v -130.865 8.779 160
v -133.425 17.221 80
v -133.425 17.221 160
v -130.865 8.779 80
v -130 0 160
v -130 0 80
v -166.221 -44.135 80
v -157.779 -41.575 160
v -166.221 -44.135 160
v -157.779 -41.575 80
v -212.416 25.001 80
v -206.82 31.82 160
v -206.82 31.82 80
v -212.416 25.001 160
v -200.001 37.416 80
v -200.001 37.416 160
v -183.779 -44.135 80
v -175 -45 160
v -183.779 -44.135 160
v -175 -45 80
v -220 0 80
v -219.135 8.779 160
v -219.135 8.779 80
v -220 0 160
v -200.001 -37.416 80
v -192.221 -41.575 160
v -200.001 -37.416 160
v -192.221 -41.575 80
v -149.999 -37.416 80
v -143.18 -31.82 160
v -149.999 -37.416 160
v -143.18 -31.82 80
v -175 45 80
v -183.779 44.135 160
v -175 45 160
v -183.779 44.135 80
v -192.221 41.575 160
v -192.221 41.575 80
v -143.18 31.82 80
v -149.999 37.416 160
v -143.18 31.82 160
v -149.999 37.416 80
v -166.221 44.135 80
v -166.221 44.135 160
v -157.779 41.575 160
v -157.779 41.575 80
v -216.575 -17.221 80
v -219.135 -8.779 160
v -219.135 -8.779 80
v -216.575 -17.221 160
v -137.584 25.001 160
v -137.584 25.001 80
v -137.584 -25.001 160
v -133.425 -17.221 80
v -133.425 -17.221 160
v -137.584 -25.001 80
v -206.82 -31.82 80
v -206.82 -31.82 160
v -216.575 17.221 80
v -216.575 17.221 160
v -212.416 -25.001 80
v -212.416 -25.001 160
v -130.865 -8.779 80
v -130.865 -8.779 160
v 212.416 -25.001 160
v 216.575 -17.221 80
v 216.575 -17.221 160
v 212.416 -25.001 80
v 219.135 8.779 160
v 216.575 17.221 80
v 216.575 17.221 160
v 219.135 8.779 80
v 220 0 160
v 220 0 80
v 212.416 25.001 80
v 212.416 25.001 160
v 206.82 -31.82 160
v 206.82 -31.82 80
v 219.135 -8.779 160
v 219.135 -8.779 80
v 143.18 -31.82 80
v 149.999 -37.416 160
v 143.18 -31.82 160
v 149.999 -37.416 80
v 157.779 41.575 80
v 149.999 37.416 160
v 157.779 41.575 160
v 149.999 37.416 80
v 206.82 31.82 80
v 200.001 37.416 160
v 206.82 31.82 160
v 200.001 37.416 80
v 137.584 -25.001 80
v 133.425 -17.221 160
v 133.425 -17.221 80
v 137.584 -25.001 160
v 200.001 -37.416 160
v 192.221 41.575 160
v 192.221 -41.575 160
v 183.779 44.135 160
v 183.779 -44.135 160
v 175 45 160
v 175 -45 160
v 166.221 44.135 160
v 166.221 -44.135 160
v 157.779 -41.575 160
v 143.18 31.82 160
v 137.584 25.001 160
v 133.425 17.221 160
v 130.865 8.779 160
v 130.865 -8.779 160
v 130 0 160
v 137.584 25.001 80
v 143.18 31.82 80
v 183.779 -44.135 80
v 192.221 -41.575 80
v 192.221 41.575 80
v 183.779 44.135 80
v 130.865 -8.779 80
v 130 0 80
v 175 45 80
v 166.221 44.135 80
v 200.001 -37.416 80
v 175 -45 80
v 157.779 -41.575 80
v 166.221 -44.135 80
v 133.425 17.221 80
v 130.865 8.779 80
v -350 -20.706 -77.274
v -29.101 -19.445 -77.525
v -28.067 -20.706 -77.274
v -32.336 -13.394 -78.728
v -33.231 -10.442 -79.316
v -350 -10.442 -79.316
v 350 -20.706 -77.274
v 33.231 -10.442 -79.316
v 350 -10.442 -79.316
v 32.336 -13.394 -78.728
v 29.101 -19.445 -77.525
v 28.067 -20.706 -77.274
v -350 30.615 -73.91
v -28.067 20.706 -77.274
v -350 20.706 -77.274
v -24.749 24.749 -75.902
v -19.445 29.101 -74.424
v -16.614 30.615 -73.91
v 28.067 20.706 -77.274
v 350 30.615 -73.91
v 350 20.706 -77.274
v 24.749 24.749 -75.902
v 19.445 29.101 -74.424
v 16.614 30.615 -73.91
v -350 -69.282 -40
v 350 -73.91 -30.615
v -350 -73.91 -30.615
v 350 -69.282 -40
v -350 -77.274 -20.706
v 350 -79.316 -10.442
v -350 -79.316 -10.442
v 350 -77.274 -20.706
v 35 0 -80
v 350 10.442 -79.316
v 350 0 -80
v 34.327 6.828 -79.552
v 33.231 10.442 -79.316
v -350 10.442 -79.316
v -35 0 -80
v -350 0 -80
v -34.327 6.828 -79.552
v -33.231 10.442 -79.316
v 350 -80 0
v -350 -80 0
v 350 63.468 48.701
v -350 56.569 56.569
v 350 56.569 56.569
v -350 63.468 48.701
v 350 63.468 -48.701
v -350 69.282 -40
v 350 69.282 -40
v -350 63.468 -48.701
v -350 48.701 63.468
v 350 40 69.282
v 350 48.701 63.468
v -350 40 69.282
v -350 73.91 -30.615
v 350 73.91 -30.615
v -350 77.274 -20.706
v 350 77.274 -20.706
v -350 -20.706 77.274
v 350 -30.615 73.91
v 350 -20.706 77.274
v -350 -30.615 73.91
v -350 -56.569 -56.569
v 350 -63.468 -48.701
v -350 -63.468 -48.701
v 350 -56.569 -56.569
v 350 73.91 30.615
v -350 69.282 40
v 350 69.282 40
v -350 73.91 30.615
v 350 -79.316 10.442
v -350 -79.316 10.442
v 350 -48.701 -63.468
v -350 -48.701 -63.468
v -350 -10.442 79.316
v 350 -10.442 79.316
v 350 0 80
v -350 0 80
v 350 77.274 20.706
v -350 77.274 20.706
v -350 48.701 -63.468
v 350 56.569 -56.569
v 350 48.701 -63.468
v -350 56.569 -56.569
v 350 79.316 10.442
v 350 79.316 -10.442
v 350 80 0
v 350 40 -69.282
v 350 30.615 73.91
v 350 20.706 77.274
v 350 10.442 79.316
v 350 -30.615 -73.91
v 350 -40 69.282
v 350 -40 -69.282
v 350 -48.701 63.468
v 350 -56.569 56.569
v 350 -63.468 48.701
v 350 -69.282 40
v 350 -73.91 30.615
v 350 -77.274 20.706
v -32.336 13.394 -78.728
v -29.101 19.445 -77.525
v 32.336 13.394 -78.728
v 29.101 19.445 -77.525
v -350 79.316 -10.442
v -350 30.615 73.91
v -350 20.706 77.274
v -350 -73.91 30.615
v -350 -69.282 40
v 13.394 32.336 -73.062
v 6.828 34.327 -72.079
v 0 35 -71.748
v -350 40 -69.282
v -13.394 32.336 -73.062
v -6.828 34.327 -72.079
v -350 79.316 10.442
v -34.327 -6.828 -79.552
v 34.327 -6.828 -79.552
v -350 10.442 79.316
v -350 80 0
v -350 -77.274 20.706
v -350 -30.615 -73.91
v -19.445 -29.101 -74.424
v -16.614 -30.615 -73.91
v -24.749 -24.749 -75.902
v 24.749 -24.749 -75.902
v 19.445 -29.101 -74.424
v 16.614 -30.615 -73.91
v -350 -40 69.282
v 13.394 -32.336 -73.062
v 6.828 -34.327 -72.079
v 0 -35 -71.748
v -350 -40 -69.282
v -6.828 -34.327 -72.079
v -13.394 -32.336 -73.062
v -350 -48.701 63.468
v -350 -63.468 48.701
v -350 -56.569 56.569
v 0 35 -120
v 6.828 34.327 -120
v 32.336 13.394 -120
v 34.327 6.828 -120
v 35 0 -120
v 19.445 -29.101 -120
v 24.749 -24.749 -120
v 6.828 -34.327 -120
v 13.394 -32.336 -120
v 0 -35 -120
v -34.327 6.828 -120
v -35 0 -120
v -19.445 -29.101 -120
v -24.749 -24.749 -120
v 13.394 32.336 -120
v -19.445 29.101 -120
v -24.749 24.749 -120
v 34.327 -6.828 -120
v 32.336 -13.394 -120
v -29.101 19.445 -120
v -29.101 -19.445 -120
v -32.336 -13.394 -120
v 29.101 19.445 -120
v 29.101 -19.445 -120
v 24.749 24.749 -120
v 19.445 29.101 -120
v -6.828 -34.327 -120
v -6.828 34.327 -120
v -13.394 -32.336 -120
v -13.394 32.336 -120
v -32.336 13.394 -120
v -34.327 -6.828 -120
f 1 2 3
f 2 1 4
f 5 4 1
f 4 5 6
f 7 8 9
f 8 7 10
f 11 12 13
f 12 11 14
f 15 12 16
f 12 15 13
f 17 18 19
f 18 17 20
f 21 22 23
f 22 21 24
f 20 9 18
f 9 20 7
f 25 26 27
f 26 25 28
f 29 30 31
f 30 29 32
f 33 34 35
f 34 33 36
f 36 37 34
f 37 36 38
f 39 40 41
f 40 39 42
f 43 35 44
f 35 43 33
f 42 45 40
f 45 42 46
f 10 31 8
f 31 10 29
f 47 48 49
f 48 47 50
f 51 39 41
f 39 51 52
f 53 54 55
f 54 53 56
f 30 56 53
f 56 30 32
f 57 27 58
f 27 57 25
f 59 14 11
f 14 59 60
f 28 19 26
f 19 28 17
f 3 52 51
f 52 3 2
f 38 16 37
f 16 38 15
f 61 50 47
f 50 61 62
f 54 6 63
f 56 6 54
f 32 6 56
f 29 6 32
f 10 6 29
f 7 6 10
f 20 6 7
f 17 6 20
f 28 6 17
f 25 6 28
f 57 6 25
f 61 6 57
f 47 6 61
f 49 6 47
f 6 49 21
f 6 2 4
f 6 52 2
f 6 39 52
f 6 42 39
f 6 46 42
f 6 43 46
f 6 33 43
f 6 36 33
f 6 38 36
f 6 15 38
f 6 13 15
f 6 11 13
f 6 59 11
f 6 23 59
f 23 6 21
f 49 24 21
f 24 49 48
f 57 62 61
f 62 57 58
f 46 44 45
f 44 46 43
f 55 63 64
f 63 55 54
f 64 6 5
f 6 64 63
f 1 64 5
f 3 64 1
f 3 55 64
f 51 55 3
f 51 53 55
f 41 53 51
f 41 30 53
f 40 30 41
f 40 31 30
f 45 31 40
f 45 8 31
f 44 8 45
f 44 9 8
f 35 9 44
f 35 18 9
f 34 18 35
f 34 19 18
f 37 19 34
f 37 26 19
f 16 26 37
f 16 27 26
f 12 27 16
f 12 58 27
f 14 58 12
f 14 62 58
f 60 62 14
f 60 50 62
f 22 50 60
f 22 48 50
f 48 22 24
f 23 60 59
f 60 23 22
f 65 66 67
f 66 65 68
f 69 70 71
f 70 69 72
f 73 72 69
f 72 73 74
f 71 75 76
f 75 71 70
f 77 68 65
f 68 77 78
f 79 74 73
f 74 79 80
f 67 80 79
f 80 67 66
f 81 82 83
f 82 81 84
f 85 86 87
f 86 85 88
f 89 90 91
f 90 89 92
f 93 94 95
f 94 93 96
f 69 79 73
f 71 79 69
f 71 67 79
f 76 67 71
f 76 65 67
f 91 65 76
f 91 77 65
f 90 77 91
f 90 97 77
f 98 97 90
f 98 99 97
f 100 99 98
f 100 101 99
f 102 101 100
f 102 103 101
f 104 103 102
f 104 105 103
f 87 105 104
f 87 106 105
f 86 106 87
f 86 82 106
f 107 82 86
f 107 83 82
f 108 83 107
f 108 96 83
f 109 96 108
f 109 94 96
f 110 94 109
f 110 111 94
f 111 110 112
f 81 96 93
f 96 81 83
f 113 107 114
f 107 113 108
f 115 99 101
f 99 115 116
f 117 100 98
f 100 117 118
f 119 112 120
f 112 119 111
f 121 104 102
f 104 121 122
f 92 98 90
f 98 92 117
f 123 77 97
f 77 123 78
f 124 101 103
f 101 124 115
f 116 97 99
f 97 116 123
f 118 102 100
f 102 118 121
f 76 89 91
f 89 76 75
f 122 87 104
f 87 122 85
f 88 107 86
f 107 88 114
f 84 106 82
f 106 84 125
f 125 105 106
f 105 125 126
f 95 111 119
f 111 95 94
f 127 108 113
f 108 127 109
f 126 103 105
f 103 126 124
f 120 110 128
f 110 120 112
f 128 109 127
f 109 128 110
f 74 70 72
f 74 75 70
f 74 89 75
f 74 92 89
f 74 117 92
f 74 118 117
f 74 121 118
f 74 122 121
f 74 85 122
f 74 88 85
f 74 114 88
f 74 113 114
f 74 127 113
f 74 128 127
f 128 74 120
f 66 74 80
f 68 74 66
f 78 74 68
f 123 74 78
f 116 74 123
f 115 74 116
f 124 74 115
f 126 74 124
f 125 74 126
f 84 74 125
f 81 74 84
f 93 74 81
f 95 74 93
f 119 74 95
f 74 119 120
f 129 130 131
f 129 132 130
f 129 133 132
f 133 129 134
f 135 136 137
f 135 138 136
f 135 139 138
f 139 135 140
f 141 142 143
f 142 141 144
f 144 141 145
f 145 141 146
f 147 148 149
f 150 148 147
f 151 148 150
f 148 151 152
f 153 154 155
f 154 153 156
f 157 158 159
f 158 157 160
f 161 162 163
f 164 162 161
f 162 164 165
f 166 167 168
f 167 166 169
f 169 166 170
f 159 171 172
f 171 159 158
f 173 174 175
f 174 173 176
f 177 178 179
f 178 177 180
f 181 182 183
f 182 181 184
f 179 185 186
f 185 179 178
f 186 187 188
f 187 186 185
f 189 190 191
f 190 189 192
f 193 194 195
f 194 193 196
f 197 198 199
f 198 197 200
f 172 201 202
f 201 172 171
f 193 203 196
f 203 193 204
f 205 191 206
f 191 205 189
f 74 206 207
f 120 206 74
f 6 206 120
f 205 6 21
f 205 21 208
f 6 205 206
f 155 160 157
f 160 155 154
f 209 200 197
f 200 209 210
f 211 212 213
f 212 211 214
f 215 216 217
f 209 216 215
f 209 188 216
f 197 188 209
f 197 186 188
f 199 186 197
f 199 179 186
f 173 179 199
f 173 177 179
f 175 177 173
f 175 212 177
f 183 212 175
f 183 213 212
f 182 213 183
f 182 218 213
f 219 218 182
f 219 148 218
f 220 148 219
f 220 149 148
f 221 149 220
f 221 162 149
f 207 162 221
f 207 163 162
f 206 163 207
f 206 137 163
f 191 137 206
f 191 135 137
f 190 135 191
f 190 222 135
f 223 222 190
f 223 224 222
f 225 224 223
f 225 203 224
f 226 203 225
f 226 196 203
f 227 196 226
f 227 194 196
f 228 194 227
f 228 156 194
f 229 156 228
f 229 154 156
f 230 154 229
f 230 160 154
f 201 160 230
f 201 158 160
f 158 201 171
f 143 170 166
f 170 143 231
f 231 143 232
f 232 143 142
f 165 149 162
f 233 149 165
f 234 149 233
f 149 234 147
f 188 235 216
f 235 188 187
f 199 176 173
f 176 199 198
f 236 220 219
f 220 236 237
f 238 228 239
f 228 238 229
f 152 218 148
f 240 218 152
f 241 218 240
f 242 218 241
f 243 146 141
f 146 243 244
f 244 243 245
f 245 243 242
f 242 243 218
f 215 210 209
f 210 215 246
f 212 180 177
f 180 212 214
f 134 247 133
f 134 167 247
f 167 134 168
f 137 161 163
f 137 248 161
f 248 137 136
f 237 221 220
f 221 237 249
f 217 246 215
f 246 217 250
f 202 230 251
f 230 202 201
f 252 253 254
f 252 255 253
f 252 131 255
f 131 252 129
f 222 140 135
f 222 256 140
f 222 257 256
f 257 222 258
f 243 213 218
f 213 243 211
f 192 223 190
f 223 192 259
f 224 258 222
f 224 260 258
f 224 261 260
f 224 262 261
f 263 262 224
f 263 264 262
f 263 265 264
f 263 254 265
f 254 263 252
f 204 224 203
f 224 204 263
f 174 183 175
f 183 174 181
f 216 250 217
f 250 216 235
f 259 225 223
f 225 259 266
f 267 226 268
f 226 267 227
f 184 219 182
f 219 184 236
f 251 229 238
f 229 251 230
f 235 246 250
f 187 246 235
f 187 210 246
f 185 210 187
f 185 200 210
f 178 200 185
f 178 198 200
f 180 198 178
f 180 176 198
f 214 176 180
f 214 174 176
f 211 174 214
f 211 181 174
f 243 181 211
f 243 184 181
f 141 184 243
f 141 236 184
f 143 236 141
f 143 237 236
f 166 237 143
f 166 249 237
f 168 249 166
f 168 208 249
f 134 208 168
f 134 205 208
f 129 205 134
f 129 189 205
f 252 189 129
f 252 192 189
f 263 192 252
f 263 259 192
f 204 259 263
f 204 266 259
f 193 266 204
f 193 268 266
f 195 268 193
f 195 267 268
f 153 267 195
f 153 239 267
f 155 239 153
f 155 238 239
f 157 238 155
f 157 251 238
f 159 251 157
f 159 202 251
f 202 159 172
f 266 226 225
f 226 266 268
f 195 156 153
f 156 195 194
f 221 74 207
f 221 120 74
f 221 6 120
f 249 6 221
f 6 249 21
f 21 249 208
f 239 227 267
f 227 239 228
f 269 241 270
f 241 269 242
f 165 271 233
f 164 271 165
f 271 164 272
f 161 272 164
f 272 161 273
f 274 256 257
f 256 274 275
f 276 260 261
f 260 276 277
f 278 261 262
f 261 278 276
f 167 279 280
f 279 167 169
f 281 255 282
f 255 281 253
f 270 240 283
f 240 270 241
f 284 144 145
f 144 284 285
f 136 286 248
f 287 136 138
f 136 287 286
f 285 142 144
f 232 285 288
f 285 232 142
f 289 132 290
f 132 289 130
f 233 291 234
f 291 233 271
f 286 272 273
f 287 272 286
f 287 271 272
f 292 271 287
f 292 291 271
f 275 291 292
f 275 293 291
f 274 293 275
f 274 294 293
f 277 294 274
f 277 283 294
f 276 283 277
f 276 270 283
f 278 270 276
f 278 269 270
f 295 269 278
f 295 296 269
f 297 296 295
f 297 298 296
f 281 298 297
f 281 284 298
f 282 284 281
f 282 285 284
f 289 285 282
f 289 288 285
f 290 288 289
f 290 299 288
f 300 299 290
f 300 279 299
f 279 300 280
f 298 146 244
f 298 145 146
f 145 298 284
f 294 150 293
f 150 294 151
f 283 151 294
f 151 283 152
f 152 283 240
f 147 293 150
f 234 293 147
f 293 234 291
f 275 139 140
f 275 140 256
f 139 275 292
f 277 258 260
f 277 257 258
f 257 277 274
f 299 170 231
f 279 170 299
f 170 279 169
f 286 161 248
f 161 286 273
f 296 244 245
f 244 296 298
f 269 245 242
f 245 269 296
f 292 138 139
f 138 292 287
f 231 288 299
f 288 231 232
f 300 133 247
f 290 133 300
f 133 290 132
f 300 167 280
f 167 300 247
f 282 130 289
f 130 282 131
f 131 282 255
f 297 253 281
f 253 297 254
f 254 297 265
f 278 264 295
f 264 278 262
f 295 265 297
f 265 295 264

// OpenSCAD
// RPZ reduced-pressure-zone backflow preventer (approx), 4".
body_l = 700;
body_d = 160;
union() {
    rotate([0, 90, 0])
        cylinder(h = body_l, d = body_d, center = true, $fn = 48);
    // Two check valve bonnets
    for (x = [-body_l * 0.25, body_l * 0.25])
        translate([x, 0, body_d / 2])
            cylinder(h = 80, d = 90, $fn = 32);
    // Relief valve in middle
    translate([0, 0, -body_d / 2 - 40])
        cylinder(h = 80, d = 70, $fn = 32);
}
